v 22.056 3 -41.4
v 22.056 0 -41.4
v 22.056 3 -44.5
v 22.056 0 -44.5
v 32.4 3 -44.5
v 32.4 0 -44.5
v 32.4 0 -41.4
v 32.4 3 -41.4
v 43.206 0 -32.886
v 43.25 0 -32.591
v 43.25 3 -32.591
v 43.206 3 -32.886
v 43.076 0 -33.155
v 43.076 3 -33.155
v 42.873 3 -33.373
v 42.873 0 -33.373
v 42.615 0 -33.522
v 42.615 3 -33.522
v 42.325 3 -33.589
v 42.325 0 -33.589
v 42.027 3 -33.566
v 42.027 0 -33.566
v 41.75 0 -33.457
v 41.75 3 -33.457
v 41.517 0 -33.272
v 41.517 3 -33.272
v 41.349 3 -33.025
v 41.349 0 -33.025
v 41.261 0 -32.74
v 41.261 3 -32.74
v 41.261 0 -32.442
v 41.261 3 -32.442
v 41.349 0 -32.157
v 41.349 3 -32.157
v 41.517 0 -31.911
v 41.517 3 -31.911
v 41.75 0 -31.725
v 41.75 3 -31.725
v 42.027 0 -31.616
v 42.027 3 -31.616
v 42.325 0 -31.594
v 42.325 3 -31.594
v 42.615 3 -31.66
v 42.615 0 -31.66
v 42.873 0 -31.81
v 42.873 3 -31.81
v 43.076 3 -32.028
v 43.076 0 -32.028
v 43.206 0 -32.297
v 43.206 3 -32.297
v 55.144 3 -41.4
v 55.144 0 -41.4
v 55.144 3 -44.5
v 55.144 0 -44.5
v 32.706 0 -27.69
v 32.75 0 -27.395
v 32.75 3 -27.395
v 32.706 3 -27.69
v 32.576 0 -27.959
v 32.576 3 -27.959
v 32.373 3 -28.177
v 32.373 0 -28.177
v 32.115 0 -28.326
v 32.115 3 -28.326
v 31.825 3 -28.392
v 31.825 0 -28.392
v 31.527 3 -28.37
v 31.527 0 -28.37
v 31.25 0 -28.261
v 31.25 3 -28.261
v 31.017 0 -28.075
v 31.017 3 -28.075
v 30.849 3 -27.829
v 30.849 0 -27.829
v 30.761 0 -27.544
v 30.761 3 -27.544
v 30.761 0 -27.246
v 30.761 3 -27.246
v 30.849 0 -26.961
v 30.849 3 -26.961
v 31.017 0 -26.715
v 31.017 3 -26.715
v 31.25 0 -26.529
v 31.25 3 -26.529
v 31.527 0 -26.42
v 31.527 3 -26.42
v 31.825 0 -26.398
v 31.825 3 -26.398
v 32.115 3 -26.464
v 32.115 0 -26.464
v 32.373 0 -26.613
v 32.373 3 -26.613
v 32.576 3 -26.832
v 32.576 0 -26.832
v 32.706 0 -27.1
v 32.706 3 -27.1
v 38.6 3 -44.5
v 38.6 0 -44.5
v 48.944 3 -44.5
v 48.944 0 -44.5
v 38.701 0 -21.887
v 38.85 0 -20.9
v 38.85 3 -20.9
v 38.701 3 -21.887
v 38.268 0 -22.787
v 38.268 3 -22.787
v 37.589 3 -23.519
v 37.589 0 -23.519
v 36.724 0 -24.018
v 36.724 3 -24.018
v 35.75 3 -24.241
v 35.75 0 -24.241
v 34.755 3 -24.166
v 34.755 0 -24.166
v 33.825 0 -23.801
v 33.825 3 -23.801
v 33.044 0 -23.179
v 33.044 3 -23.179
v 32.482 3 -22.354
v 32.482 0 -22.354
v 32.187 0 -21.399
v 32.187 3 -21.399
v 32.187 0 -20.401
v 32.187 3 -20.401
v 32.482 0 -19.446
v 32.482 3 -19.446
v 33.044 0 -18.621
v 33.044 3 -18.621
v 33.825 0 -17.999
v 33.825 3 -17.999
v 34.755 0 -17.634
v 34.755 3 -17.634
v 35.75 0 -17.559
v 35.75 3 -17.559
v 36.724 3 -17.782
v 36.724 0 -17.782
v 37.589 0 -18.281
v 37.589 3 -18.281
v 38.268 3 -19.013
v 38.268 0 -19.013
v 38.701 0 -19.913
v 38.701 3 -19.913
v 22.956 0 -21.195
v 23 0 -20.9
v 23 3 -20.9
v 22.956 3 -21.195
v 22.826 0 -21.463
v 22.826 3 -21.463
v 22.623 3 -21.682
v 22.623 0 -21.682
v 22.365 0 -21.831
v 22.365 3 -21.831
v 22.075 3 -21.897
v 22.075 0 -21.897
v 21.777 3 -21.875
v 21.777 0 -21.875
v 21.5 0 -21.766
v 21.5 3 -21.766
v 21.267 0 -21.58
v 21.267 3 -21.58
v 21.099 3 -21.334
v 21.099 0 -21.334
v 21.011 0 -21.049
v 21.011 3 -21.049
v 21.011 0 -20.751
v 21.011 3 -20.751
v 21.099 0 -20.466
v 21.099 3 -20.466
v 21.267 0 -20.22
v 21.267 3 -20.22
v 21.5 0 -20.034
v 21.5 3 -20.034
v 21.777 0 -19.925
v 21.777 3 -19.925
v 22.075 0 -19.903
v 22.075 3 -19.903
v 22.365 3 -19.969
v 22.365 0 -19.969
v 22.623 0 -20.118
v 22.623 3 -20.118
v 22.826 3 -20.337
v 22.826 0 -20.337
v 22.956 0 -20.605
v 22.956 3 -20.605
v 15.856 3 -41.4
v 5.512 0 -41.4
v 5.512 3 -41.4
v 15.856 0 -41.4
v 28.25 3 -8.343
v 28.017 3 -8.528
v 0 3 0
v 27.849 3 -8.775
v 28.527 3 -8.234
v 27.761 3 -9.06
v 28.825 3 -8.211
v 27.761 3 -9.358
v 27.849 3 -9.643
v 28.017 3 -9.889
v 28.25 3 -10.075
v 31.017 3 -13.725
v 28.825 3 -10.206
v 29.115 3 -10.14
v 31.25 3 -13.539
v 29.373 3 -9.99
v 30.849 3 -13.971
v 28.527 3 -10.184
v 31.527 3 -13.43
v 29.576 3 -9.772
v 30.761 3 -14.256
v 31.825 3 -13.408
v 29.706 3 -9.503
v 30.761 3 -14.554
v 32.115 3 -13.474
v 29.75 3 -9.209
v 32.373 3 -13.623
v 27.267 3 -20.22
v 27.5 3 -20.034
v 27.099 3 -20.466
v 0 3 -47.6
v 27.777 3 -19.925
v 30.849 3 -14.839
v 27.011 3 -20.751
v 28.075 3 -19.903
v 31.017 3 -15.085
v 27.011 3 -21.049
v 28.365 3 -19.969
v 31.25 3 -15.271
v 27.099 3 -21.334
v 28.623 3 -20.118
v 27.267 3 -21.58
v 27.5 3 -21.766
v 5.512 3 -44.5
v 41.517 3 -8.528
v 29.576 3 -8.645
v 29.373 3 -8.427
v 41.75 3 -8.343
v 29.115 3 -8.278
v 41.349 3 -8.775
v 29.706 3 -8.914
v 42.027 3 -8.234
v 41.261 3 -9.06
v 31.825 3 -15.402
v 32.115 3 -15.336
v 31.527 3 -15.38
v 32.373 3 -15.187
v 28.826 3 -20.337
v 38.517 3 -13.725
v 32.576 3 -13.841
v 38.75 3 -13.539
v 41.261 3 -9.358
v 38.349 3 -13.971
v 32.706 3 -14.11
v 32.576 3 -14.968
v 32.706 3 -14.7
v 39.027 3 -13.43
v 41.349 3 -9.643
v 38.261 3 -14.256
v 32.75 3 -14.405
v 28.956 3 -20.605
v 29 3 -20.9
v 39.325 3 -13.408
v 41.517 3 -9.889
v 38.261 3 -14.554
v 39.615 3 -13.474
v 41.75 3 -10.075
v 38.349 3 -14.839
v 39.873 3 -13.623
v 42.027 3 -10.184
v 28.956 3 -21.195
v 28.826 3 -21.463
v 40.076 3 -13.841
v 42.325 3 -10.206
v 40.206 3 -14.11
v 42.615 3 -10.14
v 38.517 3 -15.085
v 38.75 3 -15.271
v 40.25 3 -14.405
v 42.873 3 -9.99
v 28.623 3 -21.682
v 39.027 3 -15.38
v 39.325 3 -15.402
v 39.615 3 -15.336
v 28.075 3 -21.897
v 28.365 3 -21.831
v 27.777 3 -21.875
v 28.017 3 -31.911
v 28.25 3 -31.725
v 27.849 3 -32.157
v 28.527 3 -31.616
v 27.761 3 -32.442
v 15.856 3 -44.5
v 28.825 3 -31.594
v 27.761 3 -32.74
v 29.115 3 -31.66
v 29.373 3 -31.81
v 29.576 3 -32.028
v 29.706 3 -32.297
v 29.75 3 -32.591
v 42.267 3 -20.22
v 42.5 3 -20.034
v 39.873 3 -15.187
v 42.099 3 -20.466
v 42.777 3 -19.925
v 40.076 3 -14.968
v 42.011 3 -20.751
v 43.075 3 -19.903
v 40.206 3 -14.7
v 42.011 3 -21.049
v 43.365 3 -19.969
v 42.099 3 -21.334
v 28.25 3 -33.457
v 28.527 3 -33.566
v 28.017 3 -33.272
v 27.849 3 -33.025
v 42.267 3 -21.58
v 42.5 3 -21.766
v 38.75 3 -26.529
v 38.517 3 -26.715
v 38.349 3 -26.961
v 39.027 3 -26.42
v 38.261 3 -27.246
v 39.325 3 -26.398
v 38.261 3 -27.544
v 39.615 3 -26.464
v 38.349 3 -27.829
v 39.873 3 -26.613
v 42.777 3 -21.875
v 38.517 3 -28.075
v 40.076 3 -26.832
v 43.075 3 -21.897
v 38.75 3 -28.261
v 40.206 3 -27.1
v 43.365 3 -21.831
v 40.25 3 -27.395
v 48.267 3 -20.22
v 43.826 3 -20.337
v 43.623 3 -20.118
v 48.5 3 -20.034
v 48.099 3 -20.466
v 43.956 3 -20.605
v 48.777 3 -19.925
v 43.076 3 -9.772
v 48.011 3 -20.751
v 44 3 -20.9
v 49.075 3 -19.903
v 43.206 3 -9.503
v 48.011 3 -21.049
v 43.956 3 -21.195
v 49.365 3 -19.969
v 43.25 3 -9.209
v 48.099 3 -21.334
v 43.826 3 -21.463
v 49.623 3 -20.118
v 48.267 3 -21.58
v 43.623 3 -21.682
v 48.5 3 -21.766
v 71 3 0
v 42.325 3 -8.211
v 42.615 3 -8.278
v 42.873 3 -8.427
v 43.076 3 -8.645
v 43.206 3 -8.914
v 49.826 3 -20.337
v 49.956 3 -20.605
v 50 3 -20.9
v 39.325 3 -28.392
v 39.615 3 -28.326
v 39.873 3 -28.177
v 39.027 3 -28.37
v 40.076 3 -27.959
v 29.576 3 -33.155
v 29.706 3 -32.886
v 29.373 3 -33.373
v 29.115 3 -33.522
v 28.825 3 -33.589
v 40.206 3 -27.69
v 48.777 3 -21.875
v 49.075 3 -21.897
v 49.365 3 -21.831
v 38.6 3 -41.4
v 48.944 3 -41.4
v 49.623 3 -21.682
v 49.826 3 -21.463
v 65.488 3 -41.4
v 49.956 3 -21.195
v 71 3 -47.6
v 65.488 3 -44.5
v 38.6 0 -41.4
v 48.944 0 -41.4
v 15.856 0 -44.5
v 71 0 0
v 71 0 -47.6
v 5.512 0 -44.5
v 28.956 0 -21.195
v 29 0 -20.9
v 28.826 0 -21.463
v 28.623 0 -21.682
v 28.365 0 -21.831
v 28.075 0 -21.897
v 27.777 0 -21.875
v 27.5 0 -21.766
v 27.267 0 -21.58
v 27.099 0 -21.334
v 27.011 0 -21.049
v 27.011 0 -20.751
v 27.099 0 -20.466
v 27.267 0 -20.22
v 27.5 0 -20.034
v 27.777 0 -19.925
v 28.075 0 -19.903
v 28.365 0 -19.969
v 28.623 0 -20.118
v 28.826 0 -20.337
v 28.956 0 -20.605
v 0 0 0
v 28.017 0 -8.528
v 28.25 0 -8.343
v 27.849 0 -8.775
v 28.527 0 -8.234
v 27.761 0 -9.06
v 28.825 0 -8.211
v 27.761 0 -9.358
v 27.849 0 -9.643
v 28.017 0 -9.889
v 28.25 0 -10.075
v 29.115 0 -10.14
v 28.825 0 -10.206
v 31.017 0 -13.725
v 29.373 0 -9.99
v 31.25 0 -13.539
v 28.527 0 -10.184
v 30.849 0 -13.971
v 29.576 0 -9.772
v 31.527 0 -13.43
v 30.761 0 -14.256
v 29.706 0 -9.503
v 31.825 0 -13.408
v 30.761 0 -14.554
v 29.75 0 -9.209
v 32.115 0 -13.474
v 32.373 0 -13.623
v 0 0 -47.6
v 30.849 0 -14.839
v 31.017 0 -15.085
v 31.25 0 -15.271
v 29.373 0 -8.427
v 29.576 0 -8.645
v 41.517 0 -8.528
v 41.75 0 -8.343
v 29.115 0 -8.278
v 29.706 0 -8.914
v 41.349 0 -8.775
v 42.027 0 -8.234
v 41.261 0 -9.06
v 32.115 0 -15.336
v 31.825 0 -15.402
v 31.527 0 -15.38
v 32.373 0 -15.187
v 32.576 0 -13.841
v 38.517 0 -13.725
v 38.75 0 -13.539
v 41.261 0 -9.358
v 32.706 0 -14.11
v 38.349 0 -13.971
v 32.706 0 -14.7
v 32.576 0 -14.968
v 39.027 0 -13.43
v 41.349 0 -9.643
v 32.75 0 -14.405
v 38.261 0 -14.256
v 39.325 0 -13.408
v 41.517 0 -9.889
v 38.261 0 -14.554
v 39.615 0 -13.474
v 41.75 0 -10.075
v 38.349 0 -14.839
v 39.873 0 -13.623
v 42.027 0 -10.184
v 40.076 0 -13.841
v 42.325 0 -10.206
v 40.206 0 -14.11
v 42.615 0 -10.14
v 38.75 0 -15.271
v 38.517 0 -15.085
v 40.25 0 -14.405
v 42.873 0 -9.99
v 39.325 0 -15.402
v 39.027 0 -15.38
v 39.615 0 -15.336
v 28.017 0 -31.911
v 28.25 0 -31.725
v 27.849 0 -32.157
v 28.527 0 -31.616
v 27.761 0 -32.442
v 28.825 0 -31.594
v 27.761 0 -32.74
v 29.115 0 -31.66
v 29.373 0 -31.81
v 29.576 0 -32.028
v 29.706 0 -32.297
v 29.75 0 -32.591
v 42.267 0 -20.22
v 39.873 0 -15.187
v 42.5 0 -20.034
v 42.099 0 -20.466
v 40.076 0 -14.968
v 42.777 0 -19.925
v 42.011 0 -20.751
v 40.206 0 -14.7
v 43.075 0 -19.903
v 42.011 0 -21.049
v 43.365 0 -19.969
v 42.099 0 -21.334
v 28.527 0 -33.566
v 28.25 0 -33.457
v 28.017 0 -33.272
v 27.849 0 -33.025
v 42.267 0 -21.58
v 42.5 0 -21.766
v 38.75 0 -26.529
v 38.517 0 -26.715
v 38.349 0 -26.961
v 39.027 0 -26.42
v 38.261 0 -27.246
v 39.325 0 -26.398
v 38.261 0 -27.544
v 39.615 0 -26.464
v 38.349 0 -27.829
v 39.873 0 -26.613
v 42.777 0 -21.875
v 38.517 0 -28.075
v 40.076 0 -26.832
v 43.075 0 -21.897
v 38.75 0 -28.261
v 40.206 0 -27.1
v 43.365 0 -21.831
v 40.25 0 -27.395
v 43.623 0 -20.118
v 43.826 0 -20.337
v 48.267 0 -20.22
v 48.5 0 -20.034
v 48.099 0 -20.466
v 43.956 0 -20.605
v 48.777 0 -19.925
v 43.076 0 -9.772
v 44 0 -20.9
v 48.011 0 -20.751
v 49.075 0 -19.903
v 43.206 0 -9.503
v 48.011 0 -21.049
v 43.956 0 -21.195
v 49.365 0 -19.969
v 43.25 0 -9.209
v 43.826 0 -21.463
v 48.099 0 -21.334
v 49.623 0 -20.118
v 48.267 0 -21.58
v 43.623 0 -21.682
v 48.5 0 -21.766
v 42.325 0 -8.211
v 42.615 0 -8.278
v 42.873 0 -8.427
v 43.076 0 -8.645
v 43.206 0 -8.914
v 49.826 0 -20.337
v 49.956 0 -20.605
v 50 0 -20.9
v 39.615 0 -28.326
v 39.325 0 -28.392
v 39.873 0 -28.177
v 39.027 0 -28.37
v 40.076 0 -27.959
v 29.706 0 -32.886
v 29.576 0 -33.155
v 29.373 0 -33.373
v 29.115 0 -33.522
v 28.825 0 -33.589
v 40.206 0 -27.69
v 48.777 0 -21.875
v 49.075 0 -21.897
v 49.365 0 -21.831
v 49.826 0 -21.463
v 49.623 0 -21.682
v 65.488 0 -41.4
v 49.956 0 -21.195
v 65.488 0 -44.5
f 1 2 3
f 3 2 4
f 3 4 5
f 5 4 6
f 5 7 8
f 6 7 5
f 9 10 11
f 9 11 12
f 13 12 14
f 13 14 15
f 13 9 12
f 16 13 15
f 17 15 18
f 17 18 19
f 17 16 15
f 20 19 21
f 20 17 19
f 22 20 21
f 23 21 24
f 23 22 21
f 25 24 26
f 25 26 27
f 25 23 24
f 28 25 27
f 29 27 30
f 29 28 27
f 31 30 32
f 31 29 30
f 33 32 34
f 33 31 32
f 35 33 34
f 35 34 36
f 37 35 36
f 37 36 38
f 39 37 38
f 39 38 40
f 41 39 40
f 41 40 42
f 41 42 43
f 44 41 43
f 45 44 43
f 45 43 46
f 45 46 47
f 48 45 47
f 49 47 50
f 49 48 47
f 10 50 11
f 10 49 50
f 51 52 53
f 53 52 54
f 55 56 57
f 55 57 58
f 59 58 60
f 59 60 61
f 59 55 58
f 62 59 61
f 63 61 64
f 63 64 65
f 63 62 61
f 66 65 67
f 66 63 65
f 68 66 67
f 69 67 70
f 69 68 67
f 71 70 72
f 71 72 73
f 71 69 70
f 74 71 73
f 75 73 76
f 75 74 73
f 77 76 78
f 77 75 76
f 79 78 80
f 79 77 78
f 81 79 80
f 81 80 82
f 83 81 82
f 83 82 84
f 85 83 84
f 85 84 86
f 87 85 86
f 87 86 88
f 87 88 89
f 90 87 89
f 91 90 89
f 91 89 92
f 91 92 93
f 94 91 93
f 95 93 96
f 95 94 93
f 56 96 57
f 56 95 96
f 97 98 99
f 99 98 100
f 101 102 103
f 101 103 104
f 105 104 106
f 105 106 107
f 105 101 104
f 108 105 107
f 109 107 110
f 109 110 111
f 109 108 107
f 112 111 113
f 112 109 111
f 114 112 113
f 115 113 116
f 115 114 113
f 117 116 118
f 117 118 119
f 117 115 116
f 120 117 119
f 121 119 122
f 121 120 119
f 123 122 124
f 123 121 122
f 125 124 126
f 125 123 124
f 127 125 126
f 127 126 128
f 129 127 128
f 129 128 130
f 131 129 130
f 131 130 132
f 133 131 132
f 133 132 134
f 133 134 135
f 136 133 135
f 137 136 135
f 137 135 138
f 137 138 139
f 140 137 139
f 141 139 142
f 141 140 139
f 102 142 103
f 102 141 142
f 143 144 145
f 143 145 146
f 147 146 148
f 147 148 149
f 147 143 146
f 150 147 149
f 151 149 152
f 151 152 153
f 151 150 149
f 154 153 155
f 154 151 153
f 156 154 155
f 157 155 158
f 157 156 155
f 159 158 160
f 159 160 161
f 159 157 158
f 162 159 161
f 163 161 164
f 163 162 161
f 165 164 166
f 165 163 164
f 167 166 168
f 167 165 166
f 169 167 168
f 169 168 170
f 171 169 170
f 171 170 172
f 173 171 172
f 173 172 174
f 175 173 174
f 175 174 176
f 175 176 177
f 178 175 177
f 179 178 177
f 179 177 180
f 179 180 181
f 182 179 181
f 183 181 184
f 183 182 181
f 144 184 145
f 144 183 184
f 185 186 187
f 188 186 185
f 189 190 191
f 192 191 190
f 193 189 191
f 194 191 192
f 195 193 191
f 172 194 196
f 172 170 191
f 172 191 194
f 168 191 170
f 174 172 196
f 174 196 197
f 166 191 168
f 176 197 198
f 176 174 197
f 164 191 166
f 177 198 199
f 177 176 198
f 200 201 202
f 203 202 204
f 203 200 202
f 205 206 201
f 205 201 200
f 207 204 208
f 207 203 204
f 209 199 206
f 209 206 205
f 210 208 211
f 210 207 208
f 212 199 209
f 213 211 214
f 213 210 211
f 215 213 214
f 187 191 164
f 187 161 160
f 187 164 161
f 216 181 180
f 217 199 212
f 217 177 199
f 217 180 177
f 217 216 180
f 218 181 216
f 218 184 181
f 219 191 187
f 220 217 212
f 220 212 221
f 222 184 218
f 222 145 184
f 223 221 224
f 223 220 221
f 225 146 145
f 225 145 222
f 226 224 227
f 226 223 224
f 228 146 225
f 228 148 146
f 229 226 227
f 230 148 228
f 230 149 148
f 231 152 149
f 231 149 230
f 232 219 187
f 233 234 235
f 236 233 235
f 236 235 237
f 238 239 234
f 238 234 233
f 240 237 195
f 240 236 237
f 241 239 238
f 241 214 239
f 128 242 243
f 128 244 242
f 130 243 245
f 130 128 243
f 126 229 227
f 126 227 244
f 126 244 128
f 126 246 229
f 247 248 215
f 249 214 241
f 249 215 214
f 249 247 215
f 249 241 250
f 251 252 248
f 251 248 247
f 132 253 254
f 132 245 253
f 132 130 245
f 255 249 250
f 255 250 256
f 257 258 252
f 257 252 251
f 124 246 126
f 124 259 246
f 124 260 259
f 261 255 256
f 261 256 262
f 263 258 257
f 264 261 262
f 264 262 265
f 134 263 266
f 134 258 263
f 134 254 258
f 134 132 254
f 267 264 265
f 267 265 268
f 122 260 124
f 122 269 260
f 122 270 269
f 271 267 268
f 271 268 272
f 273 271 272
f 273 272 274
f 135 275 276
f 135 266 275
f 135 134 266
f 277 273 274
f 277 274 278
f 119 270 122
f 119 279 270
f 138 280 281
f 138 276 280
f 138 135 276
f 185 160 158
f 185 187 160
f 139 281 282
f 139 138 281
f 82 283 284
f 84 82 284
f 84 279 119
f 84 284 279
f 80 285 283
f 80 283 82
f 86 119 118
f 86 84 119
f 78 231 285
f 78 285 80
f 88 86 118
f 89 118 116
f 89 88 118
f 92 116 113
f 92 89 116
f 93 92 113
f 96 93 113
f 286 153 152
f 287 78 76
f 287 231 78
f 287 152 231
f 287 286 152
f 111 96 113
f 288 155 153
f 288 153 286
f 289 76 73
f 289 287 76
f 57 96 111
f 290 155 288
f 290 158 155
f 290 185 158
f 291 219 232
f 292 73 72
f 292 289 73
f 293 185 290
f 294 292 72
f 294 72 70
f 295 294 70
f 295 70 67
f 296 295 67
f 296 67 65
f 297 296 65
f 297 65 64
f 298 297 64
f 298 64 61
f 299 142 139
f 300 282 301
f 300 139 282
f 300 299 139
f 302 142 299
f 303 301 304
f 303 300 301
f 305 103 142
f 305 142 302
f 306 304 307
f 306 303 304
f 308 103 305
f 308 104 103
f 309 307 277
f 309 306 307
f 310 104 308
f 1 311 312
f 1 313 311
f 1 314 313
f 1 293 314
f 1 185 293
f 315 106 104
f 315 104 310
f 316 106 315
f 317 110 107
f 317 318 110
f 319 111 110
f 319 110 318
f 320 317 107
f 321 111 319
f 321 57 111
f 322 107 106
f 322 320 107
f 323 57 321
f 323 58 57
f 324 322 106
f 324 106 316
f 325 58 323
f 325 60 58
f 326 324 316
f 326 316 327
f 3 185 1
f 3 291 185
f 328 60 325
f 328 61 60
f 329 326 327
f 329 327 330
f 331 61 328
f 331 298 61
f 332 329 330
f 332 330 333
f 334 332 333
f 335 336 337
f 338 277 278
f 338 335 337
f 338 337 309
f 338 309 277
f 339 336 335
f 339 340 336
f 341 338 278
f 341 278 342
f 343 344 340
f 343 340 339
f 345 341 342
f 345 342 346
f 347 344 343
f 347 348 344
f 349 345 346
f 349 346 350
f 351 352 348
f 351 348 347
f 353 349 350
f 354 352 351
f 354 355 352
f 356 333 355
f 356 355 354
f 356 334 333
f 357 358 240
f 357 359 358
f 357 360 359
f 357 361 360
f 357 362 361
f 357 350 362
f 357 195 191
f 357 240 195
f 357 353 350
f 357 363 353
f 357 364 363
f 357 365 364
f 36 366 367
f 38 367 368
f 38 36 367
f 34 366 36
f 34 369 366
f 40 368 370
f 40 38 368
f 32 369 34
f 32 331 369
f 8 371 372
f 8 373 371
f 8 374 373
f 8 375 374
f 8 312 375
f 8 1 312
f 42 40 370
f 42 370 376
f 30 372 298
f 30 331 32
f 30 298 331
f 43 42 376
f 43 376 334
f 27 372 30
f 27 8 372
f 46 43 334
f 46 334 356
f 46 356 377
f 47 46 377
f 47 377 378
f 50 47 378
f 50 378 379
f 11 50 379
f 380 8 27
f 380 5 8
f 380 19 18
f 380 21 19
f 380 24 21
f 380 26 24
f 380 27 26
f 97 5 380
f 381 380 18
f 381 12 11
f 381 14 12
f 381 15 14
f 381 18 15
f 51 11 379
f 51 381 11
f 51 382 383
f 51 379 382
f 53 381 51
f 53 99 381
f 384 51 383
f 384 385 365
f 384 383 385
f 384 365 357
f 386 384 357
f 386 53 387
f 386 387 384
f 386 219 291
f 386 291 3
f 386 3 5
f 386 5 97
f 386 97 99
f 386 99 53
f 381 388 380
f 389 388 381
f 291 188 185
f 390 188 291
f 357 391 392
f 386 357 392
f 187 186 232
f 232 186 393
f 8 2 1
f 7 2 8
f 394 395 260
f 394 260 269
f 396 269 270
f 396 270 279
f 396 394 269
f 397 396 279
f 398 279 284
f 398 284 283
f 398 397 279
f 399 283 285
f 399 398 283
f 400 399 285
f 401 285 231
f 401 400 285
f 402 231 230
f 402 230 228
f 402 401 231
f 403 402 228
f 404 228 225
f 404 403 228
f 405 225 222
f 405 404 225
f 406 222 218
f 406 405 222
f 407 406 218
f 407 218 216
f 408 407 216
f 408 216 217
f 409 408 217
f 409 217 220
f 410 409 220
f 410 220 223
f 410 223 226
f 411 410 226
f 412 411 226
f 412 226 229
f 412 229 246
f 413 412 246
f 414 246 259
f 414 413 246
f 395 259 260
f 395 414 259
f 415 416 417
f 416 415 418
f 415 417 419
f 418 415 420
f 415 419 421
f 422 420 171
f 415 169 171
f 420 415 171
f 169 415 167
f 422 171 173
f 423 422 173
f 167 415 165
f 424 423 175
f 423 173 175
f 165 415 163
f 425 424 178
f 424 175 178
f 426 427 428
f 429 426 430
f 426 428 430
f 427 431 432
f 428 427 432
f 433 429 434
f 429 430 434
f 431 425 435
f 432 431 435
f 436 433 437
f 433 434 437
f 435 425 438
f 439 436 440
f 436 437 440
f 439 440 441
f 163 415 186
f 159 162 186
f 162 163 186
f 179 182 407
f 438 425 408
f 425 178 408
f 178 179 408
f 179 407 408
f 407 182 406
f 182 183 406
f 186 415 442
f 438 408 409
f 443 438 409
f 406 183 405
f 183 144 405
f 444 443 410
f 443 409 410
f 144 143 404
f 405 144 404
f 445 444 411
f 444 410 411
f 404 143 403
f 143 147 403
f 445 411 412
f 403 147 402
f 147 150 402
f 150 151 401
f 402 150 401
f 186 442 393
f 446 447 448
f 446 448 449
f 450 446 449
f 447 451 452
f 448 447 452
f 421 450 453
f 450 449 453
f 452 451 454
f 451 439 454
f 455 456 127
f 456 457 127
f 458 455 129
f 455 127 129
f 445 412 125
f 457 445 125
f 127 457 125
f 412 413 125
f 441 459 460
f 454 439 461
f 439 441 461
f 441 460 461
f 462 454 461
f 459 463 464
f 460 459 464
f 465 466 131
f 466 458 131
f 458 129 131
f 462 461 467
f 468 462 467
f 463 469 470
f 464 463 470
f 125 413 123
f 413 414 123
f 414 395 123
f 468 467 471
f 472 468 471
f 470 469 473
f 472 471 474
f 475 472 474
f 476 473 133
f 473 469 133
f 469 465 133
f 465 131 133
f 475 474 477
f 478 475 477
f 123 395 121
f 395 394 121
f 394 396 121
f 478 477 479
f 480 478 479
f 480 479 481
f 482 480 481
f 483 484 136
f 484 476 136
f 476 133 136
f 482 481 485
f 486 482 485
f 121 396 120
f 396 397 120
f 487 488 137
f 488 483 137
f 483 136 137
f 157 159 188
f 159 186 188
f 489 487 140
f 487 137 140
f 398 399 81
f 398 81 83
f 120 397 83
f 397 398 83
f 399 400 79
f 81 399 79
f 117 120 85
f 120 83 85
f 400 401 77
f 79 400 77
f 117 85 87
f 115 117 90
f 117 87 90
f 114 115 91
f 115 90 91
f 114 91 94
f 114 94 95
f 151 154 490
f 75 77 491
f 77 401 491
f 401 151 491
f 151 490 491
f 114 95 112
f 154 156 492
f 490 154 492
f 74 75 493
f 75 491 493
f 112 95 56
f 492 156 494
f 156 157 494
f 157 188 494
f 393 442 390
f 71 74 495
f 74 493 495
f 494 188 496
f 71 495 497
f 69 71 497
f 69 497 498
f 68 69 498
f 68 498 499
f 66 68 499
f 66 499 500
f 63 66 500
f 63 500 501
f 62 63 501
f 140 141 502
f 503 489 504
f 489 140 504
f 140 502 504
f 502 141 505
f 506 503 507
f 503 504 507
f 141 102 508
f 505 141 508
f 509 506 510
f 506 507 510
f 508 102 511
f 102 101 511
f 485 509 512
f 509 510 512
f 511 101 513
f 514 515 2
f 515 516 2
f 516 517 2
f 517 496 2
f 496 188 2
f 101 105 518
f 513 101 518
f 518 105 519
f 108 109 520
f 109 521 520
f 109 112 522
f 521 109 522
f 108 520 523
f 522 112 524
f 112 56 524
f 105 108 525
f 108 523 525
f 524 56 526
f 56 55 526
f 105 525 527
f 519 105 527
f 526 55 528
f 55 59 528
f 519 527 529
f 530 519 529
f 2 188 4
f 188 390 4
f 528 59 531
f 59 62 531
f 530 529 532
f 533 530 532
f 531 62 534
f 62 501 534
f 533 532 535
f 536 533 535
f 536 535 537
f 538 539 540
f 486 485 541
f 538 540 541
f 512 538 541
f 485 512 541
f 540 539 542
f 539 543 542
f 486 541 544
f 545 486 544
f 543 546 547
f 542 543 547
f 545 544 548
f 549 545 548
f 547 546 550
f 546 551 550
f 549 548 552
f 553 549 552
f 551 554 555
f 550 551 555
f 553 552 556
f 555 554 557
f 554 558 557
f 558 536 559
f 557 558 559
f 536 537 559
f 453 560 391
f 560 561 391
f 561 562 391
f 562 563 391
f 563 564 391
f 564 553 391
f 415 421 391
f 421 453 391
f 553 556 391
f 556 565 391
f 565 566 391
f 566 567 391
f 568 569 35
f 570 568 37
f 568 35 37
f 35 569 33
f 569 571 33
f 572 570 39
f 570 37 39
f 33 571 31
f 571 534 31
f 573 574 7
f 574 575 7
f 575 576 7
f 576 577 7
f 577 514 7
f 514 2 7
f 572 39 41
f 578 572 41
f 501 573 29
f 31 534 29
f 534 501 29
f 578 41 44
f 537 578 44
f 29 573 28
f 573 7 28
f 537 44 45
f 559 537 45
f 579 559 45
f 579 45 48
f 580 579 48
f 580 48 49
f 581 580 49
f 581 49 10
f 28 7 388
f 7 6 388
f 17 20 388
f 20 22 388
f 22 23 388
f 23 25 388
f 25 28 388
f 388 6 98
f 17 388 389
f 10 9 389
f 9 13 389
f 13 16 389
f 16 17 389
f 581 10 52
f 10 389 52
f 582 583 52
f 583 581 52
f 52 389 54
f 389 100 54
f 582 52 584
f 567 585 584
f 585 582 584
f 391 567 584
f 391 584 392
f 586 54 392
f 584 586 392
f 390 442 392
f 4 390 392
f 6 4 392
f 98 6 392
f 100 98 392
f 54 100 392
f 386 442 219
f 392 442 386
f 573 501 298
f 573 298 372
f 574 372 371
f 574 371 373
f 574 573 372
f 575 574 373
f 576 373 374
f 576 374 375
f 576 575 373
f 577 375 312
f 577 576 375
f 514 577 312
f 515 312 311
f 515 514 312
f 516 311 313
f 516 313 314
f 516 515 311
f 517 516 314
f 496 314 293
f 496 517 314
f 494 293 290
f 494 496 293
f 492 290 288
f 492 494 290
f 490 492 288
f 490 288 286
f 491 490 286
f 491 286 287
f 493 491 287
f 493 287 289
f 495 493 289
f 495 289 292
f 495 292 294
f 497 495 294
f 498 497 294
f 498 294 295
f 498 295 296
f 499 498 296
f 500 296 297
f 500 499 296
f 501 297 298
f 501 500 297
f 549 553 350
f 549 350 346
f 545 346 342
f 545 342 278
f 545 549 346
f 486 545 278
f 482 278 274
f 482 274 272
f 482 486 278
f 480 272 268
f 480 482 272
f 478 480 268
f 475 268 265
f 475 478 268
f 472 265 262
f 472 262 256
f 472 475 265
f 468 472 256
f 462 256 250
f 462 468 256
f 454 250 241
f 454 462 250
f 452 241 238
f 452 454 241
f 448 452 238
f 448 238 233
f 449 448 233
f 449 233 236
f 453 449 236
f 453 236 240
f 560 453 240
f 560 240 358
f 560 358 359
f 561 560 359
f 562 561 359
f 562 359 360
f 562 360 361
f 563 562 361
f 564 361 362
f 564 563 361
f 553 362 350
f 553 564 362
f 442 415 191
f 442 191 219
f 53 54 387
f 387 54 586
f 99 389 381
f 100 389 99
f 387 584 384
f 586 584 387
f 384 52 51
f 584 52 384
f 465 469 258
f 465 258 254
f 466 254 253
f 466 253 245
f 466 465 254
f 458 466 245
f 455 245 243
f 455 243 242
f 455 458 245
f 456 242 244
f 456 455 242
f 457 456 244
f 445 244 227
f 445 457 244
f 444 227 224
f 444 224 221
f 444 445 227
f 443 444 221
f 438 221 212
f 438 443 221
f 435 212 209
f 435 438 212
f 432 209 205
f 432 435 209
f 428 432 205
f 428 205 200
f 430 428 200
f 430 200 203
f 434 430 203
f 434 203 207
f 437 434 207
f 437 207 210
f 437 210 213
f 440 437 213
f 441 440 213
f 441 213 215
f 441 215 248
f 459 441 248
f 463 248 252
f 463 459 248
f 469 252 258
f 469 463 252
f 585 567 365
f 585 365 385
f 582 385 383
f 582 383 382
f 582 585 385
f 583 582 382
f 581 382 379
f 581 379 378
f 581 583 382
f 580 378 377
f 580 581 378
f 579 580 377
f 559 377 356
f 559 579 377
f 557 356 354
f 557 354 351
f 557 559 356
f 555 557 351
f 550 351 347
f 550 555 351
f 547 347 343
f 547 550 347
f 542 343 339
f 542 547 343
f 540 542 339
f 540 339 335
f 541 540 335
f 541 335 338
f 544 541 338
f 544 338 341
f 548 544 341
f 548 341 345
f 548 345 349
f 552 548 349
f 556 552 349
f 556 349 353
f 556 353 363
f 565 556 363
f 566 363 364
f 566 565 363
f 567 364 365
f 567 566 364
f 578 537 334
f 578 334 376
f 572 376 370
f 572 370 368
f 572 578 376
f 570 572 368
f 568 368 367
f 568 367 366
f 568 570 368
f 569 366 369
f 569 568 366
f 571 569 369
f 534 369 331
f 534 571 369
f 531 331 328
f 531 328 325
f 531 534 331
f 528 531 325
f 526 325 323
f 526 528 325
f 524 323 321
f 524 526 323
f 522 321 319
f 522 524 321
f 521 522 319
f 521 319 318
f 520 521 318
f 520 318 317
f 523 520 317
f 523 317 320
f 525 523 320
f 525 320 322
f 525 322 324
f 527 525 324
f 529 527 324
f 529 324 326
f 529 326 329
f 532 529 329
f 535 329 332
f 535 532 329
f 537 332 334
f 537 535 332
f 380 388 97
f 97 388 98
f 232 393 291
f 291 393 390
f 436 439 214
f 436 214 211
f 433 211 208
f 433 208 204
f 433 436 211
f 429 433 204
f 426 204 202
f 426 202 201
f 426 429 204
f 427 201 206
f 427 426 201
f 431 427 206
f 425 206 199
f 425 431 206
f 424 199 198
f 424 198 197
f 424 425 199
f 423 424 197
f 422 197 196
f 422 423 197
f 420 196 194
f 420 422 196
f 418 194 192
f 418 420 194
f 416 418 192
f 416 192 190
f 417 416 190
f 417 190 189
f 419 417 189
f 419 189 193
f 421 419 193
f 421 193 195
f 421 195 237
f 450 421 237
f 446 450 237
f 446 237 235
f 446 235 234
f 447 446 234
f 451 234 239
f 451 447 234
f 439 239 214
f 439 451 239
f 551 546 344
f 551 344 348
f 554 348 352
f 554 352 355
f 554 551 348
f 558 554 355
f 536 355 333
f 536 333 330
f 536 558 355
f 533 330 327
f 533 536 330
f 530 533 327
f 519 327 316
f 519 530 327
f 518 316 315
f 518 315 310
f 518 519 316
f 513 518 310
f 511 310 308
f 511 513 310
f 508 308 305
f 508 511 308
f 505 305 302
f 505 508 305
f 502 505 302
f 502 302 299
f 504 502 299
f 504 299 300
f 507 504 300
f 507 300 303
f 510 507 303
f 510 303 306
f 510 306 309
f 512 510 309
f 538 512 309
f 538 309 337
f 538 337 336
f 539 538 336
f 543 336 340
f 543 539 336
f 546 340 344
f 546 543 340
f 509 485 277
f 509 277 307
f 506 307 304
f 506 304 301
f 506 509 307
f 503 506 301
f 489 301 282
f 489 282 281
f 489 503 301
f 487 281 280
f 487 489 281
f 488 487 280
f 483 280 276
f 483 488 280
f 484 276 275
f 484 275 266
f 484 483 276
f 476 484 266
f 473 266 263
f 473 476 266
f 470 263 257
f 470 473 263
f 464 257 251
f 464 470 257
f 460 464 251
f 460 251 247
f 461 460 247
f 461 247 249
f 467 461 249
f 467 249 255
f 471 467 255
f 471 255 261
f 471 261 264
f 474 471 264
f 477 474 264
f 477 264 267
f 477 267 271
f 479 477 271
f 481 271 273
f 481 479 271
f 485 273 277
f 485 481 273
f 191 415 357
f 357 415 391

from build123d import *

# Parameters (mm, degrees)
SKETCH2_W           = 71
SKETCH2_H           = 47.6
SKETCH2_R           = 3.35
SKETCH2_R_2         = 1
SKETCH2_W_2         = 10.344
SKETCH2_H_2         = 3.1
BOSS_EXTRUDE1_DEPTH = 3


with BuildPart() as part:
    # Sketch2 → Boss-Extrude1 (new body)
    with BuildSketch(Plane(origin=(0, 0, 0), x_dir=(1, 0, 0), z_dir=(0, 1, 0))):
        with Locations((35.5, 23.8)):
            Rectangle(SKETCH2_W, SKETCH2_H)
        with Locations((35.5, 20.9)):
            Circle(SKETCH2_R, mode=Mode.SUBTRACT)
        with Locations((43, 20.9)):
            Circle(SKETCH2_R_2, mode=Mode.SUBTRACT)
        with Locations((49, 20.9)):
            Circle(SKETCH2_R_2, mode=Mode.SUBTRACT)
        with Locations((39.25, 14.404809472)):
            Circle(SKETCH2_R_2, mode=Mode.SUBTRACT)
        with Locations((42.25, 9.208657049)):
            Circle(SKETCH2_R_2, mode=Mode.SUBTRACT)
        with Locations((31.75, 14.404809472)):
            Circle(SKETCH2_R_2, mode=Mode.SUBTRACT)
        with Locations((28.75, 9.208657049)):
            Circle(SKETCH2_R_2, mode=Mode.SUBTRACT)
        with Locations((28, 20.9)):
            Circle(SKETCH2_R_2, mode=Mode.SUBTRACT)
        with Locations((22, 20.9)):
            Circle(SKETCH2_R_2, mode=Mode.SUBTRACT)
        with Locations((31.75, 27.395190528)):
            Circle(SKETCH2_R_2, mode=Mode.SUBTRACT)
        with Locations((28.75, 32.591342951)):
            Circle(SKETCH2_R_2, mode=Mode.SUBTRACT)
        with Locations((39.25, 27.395190528)):
            Circle(SKETCH2_R_2, mode=Mode.SUBTRACT)
        with Locations((42.25, 32.591342951)):
            Circle(SKETCH2_R_2, mode=Mode.SUBTRACT)
        with Locations((10.684, 42.95)):
            Rectangle(SKETCH2_W_2, SKETCH2_H_2, mode=Mode.SUBTRACT)
        with Locations((27.228, 42.95)):
            Rectangle(SKETCH2_W_2, SKETCH2_H_2, mode=Mode.SUBTRACT)
        with Locations((43.772, 42.95)):
            Rectangle(SKETCH2_W_2, SKETCH2_H_2, mode=Mode.SUBTRACT)
        with Locations((60.316, 42.95)):
            Rectangle(SKETCH2_W_2, SKETCH2_H_2, mode=Mode.SUBTRACT)
    extrude(amount=BOSS_EXTRUDE1_DEPTH)


solid = part.part
